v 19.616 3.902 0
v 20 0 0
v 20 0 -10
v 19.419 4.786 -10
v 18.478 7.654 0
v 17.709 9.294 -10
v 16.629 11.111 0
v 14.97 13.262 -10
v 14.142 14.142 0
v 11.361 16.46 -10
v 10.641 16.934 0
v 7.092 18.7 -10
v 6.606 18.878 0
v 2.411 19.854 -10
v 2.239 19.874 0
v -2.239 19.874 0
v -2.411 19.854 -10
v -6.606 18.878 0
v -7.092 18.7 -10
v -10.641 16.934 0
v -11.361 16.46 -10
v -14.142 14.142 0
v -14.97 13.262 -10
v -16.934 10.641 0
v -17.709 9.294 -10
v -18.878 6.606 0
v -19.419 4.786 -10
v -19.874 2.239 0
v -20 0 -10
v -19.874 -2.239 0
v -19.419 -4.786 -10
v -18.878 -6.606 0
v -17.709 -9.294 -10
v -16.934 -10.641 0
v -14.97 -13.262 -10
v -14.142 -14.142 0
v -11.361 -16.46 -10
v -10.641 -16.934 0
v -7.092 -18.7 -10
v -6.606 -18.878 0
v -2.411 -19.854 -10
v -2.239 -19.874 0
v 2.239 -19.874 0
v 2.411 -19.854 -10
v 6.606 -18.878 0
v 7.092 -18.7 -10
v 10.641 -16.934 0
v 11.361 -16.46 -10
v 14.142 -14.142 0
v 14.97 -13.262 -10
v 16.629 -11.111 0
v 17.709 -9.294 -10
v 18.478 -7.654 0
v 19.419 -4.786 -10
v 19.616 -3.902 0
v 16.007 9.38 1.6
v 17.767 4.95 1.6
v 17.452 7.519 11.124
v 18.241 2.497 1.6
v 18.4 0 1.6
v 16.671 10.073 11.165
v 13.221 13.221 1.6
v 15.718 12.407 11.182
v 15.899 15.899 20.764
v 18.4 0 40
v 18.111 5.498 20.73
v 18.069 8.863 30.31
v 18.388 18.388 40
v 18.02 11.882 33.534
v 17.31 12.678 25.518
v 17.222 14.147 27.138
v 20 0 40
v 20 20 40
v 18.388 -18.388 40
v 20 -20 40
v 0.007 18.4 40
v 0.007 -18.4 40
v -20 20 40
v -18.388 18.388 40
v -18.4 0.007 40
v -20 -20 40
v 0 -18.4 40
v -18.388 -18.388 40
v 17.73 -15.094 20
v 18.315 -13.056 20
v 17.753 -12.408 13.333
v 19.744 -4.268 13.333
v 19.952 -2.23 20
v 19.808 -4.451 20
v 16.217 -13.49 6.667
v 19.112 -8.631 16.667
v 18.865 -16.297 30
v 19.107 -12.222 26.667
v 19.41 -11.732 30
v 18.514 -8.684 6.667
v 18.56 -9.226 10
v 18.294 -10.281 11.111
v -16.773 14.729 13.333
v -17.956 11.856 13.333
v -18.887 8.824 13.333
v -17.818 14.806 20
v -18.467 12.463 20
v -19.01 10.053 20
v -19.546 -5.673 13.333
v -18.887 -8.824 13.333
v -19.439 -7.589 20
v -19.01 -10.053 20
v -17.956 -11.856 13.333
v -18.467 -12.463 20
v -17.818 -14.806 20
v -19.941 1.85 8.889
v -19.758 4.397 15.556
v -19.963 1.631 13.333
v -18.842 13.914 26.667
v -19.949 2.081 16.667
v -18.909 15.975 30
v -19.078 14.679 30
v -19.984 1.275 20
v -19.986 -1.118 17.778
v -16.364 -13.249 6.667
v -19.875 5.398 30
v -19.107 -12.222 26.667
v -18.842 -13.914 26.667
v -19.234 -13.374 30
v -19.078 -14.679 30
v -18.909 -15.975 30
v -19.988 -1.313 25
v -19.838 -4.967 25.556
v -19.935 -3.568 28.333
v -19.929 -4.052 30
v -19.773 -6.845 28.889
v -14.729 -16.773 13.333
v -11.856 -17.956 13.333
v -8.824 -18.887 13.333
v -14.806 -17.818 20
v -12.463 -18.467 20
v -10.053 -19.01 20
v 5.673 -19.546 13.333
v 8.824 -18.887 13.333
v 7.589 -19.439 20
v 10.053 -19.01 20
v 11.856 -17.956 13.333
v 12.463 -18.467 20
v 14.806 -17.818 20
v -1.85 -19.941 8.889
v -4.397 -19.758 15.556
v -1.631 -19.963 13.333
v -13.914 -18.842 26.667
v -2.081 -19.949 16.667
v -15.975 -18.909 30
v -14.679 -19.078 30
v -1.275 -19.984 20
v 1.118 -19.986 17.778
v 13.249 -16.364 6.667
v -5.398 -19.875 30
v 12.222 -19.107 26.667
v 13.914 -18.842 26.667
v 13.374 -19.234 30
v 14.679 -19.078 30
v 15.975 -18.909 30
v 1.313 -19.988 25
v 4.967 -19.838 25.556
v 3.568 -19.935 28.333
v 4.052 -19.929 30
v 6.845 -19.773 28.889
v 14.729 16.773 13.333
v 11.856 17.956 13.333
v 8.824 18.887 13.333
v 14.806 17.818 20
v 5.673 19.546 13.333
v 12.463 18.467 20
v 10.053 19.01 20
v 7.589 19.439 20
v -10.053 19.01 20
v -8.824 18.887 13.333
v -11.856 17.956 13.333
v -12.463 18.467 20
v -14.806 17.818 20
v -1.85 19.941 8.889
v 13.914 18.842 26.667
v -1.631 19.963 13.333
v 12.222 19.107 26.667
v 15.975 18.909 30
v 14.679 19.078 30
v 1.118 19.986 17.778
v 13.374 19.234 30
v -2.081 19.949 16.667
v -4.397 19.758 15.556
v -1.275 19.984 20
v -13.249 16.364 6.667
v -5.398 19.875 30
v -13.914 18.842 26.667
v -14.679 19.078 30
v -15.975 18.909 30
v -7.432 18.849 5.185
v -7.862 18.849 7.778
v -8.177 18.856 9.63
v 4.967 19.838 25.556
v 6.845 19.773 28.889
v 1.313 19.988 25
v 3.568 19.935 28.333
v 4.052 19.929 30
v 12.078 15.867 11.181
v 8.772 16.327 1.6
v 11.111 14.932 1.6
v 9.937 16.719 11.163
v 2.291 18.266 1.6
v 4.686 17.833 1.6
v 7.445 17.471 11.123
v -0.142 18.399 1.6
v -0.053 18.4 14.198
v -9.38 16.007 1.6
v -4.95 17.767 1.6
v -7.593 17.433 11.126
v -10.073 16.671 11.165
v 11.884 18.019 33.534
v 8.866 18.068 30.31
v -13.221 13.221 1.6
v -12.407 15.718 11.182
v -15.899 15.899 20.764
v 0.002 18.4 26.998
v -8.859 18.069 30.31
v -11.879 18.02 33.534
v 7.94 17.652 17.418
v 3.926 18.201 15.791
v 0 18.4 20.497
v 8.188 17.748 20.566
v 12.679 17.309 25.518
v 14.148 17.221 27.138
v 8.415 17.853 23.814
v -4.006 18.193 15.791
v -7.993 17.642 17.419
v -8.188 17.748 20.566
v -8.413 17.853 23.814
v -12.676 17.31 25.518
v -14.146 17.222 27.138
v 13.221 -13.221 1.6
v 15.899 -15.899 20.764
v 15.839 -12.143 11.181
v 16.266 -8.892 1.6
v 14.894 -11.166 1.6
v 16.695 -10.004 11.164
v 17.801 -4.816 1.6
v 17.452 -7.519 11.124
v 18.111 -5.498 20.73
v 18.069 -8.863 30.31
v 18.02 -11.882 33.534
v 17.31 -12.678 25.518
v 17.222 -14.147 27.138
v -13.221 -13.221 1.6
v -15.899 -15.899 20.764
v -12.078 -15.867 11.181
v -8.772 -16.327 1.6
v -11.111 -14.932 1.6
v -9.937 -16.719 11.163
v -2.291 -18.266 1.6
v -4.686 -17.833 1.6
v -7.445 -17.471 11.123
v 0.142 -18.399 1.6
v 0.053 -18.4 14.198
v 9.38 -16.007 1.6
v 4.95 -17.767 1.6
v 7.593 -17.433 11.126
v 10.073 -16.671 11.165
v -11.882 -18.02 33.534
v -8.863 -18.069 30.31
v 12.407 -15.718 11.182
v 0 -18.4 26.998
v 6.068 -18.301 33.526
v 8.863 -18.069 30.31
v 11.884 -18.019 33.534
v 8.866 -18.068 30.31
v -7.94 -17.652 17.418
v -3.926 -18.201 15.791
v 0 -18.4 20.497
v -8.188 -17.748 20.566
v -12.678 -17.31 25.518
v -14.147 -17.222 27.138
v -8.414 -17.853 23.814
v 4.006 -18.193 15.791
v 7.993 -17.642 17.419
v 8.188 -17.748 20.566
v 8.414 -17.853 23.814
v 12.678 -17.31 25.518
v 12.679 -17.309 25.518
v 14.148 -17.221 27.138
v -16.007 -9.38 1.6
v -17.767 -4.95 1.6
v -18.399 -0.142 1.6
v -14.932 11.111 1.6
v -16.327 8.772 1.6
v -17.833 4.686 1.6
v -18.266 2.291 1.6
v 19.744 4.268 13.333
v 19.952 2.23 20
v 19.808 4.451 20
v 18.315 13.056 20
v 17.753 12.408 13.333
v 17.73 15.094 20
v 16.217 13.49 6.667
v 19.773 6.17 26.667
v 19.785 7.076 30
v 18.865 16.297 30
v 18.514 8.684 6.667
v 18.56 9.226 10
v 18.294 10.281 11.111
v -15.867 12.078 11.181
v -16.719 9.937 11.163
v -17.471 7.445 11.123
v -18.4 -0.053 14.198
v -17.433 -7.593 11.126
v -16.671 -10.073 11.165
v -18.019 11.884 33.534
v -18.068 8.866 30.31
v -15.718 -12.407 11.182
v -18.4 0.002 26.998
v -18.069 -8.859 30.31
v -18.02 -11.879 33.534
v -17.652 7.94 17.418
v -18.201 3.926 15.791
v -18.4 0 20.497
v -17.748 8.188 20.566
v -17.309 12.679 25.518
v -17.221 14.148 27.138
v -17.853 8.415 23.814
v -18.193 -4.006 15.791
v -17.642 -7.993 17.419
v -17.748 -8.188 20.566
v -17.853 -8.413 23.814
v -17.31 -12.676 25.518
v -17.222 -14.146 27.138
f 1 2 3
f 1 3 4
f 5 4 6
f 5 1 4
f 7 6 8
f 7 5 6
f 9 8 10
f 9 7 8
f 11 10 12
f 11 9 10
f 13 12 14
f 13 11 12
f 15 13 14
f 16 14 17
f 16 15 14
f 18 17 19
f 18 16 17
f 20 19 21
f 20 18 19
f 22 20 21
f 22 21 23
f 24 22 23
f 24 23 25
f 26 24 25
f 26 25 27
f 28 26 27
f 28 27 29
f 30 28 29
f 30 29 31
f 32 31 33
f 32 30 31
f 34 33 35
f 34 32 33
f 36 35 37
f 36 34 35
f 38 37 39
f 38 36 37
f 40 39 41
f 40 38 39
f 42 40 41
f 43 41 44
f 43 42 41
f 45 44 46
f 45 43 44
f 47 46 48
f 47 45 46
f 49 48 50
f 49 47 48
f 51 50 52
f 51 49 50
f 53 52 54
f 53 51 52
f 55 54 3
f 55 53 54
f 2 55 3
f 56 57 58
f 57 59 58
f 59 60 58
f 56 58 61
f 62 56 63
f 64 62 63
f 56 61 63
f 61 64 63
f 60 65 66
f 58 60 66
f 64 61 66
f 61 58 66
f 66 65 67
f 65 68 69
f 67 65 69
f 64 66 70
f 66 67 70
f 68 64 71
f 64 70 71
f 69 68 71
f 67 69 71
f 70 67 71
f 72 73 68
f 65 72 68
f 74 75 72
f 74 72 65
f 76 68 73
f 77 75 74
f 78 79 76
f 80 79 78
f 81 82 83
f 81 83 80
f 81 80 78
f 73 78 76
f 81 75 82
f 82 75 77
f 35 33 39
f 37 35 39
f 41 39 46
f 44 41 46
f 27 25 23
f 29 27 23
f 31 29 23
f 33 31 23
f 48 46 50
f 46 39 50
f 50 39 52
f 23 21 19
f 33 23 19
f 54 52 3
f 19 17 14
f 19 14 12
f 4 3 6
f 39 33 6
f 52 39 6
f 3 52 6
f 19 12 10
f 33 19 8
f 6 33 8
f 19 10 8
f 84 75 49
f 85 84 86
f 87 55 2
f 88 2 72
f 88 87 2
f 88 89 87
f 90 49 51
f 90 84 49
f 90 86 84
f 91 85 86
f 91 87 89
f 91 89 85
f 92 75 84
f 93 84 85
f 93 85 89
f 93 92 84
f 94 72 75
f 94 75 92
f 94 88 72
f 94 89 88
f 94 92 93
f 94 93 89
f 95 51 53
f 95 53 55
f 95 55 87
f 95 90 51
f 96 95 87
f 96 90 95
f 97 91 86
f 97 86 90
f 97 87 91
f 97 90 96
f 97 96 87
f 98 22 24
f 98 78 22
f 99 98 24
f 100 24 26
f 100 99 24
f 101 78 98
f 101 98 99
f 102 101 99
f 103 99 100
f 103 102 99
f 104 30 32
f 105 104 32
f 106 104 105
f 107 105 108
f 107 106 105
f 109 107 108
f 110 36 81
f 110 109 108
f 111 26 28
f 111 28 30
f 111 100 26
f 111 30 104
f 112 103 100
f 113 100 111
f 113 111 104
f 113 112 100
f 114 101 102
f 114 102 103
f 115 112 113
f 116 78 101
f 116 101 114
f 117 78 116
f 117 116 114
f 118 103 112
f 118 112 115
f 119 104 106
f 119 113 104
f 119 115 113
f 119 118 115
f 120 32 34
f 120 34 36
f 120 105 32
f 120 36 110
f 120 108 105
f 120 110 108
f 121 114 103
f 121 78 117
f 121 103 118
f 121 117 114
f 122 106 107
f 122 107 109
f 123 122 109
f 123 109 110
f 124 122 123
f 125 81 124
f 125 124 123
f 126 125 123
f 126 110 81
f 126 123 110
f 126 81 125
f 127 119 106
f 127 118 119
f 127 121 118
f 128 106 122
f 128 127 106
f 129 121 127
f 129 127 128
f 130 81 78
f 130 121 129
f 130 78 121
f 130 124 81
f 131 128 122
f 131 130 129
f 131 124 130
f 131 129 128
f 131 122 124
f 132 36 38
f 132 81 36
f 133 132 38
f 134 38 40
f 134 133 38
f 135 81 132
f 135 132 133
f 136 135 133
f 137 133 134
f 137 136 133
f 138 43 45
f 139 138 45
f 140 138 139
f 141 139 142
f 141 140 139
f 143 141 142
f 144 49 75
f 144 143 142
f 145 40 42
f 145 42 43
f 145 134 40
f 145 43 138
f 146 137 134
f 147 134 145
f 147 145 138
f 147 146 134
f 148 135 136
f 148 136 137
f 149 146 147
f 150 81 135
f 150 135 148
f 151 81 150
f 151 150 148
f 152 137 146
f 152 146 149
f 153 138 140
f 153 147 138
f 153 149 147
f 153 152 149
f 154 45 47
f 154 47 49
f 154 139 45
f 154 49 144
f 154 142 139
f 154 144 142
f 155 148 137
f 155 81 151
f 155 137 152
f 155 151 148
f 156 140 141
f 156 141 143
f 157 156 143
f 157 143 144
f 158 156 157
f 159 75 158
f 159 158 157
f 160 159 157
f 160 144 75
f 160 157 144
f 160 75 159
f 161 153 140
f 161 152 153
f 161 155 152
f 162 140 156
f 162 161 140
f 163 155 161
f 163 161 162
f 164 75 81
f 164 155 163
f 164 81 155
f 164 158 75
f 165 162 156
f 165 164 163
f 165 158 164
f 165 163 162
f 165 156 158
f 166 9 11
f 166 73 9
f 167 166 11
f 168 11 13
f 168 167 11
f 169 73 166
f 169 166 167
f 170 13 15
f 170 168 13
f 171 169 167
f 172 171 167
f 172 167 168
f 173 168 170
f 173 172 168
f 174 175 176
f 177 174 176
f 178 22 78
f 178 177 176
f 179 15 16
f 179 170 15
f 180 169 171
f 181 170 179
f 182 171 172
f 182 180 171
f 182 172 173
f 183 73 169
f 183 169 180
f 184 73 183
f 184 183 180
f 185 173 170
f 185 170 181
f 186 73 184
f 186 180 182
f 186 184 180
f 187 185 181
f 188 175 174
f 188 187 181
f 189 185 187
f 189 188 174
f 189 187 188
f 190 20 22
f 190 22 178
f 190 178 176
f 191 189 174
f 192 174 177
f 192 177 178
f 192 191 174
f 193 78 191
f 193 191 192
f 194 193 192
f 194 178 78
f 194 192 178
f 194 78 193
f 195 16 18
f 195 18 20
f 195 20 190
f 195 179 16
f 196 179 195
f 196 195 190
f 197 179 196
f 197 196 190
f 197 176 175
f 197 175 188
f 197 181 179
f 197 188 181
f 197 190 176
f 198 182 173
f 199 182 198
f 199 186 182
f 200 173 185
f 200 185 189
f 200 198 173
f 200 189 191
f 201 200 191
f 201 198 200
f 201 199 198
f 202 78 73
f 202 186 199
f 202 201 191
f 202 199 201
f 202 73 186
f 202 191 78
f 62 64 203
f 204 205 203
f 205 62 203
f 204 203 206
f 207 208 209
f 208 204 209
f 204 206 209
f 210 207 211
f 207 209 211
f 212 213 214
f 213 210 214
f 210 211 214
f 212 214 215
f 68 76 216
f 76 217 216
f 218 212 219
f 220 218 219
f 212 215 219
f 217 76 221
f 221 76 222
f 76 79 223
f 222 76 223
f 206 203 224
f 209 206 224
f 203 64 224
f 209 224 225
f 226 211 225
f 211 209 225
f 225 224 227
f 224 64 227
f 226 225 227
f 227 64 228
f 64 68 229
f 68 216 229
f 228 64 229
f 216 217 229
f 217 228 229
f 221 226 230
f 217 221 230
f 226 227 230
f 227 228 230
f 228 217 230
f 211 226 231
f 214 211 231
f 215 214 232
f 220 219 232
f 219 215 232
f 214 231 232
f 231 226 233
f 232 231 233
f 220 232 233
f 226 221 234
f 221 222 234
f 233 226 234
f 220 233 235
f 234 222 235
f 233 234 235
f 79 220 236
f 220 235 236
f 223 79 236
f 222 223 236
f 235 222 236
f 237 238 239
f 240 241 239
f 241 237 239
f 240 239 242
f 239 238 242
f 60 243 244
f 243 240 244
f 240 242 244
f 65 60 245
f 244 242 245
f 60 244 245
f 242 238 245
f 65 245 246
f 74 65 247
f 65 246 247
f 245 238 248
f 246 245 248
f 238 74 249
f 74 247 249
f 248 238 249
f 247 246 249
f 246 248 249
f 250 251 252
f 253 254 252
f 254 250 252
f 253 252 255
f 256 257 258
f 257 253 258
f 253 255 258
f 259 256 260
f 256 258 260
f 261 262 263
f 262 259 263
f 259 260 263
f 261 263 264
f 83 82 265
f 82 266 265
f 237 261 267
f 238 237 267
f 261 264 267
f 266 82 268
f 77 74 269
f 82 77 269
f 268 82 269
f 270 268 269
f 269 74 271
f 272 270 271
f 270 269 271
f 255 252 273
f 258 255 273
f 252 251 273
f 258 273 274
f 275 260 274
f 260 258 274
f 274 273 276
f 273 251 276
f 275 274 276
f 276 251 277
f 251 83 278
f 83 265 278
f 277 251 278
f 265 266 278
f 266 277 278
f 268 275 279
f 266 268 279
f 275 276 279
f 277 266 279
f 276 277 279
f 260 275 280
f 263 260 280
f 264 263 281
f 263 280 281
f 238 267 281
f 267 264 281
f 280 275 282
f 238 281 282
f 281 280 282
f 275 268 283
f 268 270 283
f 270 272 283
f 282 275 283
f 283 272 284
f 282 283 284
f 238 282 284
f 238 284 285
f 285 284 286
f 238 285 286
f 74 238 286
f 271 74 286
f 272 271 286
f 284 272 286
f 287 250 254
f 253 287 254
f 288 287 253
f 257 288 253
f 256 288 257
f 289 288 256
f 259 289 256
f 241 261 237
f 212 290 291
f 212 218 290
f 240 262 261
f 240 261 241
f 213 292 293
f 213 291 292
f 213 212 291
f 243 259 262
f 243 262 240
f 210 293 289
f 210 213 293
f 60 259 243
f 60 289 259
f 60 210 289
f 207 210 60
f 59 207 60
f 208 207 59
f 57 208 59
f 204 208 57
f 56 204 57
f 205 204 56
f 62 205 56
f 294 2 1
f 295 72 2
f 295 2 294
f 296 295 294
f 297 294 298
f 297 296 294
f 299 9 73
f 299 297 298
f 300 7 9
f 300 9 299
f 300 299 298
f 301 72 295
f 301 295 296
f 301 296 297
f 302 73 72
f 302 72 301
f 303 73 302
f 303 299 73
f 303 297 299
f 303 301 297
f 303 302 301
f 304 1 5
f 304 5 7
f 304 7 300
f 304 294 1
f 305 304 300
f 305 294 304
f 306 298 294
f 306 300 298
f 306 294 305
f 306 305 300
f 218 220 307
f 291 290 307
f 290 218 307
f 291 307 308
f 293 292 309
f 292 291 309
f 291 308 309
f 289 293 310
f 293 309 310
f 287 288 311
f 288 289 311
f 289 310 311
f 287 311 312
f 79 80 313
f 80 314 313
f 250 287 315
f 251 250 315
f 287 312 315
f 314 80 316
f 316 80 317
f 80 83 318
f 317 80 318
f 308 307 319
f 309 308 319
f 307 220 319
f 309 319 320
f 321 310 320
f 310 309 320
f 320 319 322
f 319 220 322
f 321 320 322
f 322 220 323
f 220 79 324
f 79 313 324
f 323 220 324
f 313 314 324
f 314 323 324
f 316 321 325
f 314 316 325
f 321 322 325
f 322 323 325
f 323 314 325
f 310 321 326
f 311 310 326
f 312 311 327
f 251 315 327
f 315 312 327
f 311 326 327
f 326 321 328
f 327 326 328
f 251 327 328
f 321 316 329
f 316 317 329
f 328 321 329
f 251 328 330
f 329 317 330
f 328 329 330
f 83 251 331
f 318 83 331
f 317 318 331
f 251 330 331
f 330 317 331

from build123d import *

# Parameters (mm, degrees)
F0_R     = 20
F2_W     = 40
F2_H     = 40
F4_T     = 1.6
F5_DEPTH = 10


# Not quite as in the source:
# - a shell that OpenCascade refuses in one call is made with other operations: the cavity is built on its own and cut out


with BuildPart() as f3:
    # F0 (on Top) → F3 section 0
    with BuildSketch(Plane.XY):
        Circle(F0_R)
    # F2 (on offset) → F3 section 1
    with BuildSketch(Plane.XY.offset(40)):
        Rectangle(F2_W, F2_H)
    loft()

    # F4: shell of thickness 1.6, made by hand


with BuildPart() as f4_core1:
    # F4_t2: copy of F3
    add(f3.part)

    # the walls: a layer under each face that stays
    f4_faces = [f4_core1.faces().sort_by_distance(p)[0] for p in [
        (19.2387953231, 8.8268343228, 20),
        (0, 19.9999999992, 20),
        (-19.9999999992, 0, 20),
        (0, -19.9999999992, 20),
        (19.2387953231, -8.8268343228, 20),
        (0, 0, 0),
    ]]
    thicken(f4_faces, amount=-F4_T, mode=Mode.SUBTRACT)


with BuildPart() as f3_1:
    add(f3.part)

    # what is left inside the walls is the cavity
    f4_cavity = [f4_core1.part.solids().sort_by_distance(p)[0] for p in [
        (3.677504, 7.355008, 39.984),
    ]]
    add(f4_cavity, mode=Mode.SUBTRACT)

    # F0 (on Top) → F5 (join)
    with BuildSketch(Plane.XY):
        Circle(F0_R)
    extrude(amount=-F5_DEPTH)


solid = f3_1.part
